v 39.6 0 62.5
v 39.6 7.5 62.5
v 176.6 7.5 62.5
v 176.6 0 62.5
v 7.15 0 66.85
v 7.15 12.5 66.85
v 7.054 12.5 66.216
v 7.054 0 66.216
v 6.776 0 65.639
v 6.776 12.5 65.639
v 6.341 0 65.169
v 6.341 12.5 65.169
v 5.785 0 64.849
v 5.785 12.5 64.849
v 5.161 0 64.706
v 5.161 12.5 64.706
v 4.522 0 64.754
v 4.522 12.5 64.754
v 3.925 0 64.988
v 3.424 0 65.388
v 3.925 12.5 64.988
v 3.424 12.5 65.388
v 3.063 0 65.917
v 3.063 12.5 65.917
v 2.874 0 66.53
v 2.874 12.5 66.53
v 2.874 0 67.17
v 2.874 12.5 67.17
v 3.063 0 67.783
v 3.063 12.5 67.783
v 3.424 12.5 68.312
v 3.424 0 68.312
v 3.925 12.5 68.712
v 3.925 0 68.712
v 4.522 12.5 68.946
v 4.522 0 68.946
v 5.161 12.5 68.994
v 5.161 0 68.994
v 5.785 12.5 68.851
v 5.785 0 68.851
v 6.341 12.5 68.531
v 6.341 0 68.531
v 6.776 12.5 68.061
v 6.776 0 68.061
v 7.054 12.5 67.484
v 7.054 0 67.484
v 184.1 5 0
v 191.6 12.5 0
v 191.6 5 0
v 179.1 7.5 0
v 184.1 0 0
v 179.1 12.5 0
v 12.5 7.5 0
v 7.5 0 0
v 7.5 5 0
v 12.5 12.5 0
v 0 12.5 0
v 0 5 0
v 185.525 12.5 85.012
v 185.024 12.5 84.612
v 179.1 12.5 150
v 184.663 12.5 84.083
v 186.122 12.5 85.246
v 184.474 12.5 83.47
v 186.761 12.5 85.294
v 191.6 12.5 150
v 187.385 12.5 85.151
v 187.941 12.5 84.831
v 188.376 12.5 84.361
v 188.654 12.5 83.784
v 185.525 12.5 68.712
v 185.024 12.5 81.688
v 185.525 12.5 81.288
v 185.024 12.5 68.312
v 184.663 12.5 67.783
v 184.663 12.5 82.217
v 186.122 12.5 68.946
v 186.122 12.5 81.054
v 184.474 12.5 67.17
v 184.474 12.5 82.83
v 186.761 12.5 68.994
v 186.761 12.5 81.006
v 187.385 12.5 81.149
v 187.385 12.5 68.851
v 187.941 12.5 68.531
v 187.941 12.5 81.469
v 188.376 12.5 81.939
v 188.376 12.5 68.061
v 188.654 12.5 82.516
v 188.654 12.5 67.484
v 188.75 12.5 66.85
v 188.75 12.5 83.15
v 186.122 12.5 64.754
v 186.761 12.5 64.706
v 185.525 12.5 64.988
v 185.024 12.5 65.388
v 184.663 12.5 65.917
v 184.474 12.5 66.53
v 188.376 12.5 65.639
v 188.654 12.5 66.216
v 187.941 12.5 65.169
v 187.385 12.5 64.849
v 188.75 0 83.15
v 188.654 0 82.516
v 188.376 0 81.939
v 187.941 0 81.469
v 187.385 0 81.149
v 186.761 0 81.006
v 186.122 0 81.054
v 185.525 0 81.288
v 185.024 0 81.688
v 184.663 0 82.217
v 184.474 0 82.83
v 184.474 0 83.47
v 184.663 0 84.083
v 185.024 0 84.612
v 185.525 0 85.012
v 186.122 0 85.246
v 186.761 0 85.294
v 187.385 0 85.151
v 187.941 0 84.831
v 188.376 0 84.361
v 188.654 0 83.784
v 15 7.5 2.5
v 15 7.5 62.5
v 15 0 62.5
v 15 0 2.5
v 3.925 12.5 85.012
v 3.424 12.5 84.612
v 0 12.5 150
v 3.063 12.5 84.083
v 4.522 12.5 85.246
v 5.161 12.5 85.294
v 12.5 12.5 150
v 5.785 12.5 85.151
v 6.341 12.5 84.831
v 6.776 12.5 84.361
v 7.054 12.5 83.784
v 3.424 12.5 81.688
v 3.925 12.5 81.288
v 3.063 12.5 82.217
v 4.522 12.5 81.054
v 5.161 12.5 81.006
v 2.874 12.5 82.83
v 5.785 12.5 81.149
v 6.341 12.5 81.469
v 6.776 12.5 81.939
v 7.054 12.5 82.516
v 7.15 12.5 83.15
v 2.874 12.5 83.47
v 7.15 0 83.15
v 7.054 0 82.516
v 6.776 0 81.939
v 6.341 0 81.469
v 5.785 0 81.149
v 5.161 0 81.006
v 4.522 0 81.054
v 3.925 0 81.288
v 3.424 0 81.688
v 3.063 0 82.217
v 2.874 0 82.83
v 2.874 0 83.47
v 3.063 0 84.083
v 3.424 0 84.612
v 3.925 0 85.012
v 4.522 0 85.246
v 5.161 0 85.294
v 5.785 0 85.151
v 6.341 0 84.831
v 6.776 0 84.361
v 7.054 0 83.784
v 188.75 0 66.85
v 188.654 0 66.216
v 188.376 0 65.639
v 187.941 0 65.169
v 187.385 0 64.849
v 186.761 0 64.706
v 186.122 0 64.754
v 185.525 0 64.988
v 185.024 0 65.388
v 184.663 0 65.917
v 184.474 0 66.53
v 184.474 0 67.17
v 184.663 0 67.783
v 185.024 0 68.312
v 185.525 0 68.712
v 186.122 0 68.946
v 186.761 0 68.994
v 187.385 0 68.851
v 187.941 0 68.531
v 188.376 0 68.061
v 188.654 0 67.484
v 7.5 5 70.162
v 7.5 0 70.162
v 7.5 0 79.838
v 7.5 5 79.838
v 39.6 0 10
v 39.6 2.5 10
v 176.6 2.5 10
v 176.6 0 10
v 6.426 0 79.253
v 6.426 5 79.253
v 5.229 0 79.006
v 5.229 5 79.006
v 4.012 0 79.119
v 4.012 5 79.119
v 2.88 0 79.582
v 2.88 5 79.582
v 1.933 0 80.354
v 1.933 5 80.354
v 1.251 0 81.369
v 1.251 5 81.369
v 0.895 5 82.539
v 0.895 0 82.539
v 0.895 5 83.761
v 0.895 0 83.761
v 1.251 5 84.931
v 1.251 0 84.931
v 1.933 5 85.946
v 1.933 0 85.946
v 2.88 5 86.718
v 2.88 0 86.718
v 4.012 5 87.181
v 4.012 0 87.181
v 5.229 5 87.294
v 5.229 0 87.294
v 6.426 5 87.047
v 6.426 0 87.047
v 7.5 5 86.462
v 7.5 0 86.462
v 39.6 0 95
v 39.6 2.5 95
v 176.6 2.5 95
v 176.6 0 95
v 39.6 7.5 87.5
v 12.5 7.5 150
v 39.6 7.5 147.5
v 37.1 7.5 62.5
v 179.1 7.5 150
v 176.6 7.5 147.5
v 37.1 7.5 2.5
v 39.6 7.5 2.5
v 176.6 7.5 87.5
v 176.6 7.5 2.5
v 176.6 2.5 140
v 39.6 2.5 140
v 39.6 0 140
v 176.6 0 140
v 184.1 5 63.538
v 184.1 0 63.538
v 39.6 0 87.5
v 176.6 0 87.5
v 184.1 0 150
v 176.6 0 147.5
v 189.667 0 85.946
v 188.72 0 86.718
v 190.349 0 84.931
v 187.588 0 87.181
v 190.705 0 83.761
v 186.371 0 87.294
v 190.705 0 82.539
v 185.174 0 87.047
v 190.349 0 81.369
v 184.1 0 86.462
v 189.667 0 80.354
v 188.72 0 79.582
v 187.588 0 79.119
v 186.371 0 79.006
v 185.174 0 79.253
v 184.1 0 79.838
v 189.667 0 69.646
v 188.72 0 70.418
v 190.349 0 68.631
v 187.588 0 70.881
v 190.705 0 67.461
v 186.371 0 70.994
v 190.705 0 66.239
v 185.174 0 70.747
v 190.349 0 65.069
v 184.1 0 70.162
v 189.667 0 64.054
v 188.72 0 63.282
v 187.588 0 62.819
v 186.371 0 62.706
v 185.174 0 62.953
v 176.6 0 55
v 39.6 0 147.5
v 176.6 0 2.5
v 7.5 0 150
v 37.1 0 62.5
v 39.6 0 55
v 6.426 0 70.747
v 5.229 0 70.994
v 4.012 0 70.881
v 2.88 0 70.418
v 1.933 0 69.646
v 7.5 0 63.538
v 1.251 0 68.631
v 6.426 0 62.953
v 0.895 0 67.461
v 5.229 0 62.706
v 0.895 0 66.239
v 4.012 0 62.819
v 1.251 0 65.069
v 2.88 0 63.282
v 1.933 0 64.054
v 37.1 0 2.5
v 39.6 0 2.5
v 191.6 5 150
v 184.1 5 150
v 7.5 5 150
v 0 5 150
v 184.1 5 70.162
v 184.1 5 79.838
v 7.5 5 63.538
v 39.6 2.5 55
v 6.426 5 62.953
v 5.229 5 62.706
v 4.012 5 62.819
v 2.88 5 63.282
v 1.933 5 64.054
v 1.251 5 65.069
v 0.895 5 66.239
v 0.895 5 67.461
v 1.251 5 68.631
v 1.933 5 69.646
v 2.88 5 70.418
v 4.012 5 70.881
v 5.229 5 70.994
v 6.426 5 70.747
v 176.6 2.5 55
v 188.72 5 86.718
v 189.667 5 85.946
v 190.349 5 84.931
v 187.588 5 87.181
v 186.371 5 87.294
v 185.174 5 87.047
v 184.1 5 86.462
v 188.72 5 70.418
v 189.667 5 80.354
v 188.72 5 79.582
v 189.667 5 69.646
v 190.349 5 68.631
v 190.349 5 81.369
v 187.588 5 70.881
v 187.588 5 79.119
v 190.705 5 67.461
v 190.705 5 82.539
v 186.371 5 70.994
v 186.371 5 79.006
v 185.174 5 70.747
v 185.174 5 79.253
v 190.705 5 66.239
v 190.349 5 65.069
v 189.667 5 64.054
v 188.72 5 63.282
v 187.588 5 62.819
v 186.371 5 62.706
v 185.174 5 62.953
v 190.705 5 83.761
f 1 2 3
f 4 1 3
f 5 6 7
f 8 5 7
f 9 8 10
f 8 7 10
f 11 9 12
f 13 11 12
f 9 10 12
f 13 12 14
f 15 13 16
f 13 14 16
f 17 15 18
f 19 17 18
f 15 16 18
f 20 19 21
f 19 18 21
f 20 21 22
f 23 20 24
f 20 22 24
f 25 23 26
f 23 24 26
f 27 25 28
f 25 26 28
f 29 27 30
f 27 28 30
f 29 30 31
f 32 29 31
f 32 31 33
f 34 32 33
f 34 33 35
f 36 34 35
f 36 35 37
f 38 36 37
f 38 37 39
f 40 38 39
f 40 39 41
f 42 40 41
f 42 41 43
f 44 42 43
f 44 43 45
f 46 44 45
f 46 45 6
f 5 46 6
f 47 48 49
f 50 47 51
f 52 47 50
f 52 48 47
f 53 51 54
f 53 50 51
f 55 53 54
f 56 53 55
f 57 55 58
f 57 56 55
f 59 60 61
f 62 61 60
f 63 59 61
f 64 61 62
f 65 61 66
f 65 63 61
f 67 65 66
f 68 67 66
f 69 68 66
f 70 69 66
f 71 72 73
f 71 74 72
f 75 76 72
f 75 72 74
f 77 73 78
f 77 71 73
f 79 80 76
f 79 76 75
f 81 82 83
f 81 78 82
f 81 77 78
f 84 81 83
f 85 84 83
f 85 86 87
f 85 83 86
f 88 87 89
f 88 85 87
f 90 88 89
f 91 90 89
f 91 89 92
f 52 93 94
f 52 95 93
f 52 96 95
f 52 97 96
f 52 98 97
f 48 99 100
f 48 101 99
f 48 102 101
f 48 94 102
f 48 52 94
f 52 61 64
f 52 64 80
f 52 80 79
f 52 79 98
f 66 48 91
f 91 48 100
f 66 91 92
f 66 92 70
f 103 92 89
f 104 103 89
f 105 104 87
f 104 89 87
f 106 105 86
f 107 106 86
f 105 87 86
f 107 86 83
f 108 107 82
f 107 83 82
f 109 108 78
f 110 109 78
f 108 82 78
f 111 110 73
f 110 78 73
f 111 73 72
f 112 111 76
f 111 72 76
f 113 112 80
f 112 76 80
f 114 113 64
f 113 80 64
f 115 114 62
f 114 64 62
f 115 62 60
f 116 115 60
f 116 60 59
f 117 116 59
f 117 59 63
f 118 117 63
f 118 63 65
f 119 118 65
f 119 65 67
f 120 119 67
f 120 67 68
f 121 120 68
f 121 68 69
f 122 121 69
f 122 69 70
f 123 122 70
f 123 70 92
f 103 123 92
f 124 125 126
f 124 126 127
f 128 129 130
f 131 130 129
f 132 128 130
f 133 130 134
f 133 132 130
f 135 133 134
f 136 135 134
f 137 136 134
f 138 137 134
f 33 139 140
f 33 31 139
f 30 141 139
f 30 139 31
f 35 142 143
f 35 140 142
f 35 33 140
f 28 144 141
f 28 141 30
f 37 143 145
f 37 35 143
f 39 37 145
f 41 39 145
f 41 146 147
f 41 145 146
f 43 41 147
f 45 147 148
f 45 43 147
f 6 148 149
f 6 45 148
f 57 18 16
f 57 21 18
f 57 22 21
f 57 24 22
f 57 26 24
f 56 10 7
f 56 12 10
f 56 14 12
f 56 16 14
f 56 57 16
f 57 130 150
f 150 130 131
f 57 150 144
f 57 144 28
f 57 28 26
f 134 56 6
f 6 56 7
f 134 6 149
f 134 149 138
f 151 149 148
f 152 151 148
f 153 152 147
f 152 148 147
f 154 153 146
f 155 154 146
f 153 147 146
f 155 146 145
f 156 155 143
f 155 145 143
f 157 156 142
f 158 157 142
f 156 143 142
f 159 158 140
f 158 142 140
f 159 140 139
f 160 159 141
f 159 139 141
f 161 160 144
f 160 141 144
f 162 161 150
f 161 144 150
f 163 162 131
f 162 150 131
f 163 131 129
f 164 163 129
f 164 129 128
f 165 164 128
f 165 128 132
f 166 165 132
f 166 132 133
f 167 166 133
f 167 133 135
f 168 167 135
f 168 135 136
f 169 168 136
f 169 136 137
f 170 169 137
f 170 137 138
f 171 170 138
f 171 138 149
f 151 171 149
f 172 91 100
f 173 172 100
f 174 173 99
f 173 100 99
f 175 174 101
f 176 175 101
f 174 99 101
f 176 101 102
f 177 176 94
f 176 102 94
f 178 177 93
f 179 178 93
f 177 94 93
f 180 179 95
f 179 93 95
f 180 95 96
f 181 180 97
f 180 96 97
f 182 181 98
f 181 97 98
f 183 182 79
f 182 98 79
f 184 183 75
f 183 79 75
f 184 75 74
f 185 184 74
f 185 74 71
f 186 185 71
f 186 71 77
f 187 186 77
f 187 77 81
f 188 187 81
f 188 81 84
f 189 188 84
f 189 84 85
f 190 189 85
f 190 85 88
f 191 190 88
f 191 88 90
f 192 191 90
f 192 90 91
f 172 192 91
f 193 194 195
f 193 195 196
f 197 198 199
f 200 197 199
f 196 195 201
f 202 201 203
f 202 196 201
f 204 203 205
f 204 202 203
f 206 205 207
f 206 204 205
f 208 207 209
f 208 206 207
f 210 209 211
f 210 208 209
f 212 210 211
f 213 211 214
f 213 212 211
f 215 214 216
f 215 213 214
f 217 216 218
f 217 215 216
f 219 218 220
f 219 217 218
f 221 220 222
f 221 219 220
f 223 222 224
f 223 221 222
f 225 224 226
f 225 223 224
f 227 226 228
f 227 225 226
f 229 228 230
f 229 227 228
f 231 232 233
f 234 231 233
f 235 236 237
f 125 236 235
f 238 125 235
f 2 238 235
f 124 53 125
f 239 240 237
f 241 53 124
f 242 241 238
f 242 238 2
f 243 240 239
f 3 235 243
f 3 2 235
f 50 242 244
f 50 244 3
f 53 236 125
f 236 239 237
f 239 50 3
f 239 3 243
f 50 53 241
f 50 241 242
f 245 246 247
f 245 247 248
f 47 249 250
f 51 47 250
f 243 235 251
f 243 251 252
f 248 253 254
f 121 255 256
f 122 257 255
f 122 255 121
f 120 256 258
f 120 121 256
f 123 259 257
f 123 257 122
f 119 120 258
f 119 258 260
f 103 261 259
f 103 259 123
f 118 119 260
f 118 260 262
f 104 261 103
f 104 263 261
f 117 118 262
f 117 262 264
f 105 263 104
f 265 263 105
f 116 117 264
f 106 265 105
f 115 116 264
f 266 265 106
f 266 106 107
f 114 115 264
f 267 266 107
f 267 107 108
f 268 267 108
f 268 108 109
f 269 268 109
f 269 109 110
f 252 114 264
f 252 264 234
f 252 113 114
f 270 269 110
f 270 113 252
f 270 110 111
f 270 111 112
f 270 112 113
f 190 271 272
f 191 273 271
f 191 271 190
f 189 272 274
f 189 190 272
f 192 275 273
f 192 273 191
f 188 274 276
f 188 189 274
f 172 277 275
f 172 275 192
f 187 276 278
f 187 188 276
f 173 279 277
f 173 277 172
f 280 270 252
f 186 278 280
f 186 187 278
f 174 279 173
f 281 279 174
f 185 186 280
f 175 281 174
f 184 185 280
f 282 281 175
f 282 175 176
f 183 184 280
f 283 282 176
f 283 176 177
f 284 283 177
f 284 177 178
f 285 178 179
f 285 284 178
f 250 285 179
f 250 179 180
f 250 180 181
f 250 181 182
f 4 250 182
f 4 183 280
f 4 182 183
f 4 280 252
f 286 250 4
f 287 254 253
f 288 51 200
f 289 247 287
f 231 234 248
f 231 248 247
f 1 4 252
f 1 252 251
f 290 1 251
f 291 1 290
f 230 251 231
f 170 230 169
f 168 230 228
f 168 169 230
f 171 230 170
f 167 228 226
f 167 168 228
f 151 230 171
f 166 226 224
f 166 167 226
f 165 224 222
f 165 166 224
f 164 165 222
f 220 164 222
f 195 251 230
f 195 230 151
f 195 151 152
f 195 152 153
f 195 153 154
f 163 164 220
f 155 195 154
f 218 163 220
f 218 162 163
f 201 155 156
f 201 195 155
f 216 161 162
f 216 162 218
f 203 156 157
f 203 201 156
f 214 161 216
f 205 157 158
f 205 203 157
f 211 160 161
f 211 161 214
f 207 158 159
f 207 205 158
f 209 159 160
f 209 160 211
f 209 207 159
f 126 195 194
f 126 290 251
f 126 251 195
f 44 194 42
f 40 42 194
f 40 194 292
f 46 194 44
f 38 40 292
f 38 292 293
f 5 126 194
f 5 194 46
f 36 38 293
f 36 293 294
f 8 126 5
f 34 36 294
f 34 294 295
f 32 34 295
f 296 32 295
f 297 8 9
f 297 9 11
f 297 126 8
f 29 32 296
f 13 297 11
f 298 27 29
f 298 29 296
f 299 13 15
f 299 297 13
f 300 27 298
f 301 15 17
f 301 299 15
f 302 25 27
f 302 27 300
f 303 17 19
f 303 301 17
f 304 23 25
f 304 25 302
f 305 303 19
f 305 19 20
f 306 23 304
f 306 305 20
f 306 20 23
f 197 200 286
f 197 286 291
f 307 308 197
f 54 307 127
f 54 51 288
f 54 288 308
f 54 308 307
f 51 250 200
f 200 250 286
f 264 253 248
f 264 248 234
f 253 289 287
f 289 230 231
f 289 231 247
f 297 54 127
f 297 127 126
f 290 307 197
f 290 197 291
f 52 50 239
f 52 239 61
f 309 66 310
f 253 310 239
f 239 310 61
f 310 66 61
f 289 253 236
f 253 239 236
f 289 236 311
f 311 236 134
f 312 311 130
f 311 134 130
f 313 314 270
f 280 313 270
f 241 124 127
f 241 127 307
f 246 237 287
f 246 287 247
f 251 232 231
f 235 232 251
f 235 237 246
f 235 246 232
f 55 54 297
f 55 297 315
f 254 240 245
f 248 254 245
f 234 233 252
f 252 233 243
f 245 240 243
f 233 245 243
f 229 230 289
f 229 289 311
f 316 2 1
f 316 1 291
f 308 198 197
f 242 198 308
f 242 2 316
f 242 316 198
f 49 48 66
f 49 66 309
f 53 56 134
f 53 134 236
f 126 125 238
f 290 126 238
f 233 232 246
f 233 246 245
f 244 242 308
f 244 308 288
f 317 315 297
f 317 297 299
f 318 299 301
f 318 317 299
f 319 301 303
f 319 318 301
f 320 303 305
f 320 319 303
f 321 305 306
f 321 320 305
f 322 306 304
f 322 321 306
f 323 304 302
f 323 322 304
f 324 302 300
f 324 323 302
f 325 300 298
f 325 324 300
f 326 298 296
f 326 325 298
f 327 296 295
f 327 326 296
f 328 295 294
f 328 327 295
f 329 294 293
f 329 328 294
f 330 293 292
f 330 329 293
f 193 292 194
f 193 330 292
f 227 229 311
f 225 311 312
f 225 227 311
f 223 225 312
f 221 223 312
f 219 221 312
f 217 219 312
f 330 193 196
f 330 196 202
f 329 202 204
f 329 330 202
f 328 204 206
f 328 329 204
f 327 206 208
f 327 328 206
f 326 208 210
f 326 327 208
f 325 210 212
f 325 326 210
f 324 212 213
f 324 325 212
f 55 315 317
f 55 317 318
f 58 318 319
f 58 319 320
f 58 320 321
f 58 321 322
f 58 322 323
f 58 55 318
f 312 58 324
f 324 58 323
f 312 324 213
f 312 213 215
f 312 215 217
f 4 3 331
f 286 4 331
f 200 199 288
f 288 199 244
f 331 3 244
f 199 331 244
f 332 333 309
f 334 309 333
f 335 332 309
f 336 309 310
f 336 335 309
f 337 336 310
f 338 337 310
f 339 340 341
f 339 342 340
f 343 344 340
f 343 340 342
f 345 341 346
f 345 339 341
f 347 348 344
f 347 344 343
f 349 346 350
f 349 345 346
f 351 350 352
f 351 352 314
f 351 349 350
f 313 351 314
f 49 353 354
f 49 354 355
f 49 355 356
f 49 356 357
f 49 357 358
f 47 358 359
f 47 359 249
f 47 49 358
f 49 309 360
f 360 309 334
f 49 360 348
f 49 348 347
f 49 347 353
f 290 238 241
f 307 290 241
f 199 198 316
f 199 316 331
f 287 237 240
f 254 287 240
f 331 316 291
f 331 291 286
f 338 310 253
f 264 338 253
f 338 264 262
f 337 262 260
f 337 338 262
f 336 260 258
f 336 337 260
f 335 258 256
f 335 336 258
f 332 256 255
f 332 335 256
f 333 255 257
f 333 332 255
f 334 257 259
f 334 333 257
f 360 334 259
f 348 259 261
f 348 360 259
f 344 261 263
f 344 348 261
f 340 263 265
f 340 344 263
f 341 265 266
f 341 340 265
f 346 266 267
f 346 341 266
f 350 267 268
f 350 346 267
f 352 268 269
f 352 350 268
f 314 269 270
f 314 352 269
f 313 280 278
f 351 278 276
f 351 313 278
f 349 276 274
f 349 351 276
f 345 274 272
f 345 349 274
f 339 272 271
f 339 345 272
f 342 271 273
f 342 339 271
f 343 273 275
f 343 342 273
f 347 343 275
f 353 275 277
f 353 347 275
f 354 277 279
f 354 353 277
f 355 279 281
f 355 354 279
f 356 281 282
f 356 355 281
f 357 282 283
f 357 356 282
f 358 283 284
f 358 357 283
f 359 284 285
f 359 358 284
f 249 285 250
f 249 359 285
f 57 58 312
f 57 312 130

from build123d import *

# Parameters (mm, degrees)
PLATEFRAME_DEPTH          = 150
SKETCH3_R                 = 2.15
HOLESUPPORT_DEPTH         = 7.5
SKETCH4_R                 = 4.15
SKETCH4_R_2               = 2.15
CYLINDRICALSUPPORTS_DEPTH = 12.5
SKETCH8_W                 = 137
SKETCH8_H                 = 60
ITEMLAYOUT_DEPTH          = 5
SKETCH9_W                 = 137
SKETCH9_H                 = 7.5
VELCROHOLES_DEPTH         = 3.5
SKETCH10_W                = 22.1
SKETCH10_H                = 60
OPENHOLE_DEPTH            = 8.5


with BuildPart() as part:
    # Sketch2 → PlateFrame (new body)
    with BuildSketch(Plane.XY):
        Polygon((179.1, 12.5), (191.6, 12.5), (191.6, 5), (184.1, 5), (184.1, 0), (7.5, 0), (7.5, 5), (0, 5), (0, 12.5), (12.5, 12.5), (12.5, 7.5), (179.1, 7.5), align=None)
    extrude(amount=PLATEFRAME_DEPTH)

    # Sketch3 → HoleSupport (cut)
    with BuildSketch(Plane(origin=(0, 12.5, 0), x_dir=(1, 0, 0), z_dir=(0, 1, 0))):
        with Locations((5, -66.85)):
            Circle(SKETCH3_R)
        with Locations((5, -83.15)):
            Circle(SKETCH3_R)
        with Locations((186.6, -66.85)):
            Circle(SKETCH3_R)
        with Locations((186.6, -83.15)):
            Circle(SKETCH3_R)
    extrude(amount=-HOLESUPPORT_DEPTH, mode=Mode.SUBTRACT)

    # Sketch4 → CylindricalSupports (add)
    with BuildSketch(Plane(origin=(0, 12.5, 0), x_dir=(1, 0, 0), z_dir=(0, 1, 0))):
        with Locations((186.6, -66.85)):
            Circle(SKETCH4_R)
        with Locations((186.6, -66.85)):
            Circle(SKETCH4_R_2, mode=Mode.SUBTRACT)
        with Locations((186.6, -83.15)):
            Circle(SKETCH4_R)
        with Locations((186.6, -83.15)):
            Circle(SKETCH4_R_2, mode=Mode.SUBTRACT)
        with Locations((5, -66.85)):
            Circle(SKETCH4_R)
        with Locations((5, -66.85)):
            Circle(SKETCH4_R_2, mode=Mode.SUBTRACT)
        with Locations((5, -83.15)):
            Circle(SKETCH4_R)
        with Locations((5, -83.15)):
            Circle(SKETCH4_R_2, mode=Mode.SUBTRACT)
    extrude(amount=-CYLINDRICALSUPPORTS_DEPTH)

    # Sketch8 → ItemLayout (cut)
    with BuildSketch(Plane(origin=(0, 7.5, 0), x_dir=(1, 0, 0), z_dir=(0, 1, 0))):
        with Locations((108.1, -32.5)):
            Rectangle(SKETCH8_W, SKETCH8_H)
        with Locations((108.1, -117.5)):
            Rectangle(SKETCH8_W, SKETCH8_H)
    extrude(amount=-ITEMLAYOUT_DEPTH, mode=Mode.SUBTRACT)

    # Sketch9 → VelcroHoles (cut, through all)
    with BuildSketch(Plane(origin=(0, 2.5, 0), x_dir=(1, 0, 0), z_dir=(0, 1, 0))):
        with Locations((108.1, -143.75)):
            Rectangle(SKETCH9_W, SKETCH9_H)
        with Locations((108.1, -6.25)):
            Rectangle(SKETCH9_W, SKETCH9_H)
        with Locations((108.1, -91.25)):
            Rectangle(SKETCH9_W, SKETCH9_H)
        with Locations((108.1, -58.75)):
            Rectangle(SKETCH9_W, SKETCH9_H)
    extrude(amount=-VELCROHOLES_DEPTH, mode=Mode.SUBTRACT)

    # Sketch10 → OpenHole (cut, through all)
    with BuildSketch(Plane(origin=(0, 7.5, 0), x_dir=(1, 0, 0), z_dir=(0, 1, 0))):
        with Locations((26.05, -32.5)):
            Rectangle(SKETCH10_W, SKETCH10_H)
    extrude(amount=-OPENHOLE_DEPTH, mode=Mode.SUBTRACT)


solid = part.part
